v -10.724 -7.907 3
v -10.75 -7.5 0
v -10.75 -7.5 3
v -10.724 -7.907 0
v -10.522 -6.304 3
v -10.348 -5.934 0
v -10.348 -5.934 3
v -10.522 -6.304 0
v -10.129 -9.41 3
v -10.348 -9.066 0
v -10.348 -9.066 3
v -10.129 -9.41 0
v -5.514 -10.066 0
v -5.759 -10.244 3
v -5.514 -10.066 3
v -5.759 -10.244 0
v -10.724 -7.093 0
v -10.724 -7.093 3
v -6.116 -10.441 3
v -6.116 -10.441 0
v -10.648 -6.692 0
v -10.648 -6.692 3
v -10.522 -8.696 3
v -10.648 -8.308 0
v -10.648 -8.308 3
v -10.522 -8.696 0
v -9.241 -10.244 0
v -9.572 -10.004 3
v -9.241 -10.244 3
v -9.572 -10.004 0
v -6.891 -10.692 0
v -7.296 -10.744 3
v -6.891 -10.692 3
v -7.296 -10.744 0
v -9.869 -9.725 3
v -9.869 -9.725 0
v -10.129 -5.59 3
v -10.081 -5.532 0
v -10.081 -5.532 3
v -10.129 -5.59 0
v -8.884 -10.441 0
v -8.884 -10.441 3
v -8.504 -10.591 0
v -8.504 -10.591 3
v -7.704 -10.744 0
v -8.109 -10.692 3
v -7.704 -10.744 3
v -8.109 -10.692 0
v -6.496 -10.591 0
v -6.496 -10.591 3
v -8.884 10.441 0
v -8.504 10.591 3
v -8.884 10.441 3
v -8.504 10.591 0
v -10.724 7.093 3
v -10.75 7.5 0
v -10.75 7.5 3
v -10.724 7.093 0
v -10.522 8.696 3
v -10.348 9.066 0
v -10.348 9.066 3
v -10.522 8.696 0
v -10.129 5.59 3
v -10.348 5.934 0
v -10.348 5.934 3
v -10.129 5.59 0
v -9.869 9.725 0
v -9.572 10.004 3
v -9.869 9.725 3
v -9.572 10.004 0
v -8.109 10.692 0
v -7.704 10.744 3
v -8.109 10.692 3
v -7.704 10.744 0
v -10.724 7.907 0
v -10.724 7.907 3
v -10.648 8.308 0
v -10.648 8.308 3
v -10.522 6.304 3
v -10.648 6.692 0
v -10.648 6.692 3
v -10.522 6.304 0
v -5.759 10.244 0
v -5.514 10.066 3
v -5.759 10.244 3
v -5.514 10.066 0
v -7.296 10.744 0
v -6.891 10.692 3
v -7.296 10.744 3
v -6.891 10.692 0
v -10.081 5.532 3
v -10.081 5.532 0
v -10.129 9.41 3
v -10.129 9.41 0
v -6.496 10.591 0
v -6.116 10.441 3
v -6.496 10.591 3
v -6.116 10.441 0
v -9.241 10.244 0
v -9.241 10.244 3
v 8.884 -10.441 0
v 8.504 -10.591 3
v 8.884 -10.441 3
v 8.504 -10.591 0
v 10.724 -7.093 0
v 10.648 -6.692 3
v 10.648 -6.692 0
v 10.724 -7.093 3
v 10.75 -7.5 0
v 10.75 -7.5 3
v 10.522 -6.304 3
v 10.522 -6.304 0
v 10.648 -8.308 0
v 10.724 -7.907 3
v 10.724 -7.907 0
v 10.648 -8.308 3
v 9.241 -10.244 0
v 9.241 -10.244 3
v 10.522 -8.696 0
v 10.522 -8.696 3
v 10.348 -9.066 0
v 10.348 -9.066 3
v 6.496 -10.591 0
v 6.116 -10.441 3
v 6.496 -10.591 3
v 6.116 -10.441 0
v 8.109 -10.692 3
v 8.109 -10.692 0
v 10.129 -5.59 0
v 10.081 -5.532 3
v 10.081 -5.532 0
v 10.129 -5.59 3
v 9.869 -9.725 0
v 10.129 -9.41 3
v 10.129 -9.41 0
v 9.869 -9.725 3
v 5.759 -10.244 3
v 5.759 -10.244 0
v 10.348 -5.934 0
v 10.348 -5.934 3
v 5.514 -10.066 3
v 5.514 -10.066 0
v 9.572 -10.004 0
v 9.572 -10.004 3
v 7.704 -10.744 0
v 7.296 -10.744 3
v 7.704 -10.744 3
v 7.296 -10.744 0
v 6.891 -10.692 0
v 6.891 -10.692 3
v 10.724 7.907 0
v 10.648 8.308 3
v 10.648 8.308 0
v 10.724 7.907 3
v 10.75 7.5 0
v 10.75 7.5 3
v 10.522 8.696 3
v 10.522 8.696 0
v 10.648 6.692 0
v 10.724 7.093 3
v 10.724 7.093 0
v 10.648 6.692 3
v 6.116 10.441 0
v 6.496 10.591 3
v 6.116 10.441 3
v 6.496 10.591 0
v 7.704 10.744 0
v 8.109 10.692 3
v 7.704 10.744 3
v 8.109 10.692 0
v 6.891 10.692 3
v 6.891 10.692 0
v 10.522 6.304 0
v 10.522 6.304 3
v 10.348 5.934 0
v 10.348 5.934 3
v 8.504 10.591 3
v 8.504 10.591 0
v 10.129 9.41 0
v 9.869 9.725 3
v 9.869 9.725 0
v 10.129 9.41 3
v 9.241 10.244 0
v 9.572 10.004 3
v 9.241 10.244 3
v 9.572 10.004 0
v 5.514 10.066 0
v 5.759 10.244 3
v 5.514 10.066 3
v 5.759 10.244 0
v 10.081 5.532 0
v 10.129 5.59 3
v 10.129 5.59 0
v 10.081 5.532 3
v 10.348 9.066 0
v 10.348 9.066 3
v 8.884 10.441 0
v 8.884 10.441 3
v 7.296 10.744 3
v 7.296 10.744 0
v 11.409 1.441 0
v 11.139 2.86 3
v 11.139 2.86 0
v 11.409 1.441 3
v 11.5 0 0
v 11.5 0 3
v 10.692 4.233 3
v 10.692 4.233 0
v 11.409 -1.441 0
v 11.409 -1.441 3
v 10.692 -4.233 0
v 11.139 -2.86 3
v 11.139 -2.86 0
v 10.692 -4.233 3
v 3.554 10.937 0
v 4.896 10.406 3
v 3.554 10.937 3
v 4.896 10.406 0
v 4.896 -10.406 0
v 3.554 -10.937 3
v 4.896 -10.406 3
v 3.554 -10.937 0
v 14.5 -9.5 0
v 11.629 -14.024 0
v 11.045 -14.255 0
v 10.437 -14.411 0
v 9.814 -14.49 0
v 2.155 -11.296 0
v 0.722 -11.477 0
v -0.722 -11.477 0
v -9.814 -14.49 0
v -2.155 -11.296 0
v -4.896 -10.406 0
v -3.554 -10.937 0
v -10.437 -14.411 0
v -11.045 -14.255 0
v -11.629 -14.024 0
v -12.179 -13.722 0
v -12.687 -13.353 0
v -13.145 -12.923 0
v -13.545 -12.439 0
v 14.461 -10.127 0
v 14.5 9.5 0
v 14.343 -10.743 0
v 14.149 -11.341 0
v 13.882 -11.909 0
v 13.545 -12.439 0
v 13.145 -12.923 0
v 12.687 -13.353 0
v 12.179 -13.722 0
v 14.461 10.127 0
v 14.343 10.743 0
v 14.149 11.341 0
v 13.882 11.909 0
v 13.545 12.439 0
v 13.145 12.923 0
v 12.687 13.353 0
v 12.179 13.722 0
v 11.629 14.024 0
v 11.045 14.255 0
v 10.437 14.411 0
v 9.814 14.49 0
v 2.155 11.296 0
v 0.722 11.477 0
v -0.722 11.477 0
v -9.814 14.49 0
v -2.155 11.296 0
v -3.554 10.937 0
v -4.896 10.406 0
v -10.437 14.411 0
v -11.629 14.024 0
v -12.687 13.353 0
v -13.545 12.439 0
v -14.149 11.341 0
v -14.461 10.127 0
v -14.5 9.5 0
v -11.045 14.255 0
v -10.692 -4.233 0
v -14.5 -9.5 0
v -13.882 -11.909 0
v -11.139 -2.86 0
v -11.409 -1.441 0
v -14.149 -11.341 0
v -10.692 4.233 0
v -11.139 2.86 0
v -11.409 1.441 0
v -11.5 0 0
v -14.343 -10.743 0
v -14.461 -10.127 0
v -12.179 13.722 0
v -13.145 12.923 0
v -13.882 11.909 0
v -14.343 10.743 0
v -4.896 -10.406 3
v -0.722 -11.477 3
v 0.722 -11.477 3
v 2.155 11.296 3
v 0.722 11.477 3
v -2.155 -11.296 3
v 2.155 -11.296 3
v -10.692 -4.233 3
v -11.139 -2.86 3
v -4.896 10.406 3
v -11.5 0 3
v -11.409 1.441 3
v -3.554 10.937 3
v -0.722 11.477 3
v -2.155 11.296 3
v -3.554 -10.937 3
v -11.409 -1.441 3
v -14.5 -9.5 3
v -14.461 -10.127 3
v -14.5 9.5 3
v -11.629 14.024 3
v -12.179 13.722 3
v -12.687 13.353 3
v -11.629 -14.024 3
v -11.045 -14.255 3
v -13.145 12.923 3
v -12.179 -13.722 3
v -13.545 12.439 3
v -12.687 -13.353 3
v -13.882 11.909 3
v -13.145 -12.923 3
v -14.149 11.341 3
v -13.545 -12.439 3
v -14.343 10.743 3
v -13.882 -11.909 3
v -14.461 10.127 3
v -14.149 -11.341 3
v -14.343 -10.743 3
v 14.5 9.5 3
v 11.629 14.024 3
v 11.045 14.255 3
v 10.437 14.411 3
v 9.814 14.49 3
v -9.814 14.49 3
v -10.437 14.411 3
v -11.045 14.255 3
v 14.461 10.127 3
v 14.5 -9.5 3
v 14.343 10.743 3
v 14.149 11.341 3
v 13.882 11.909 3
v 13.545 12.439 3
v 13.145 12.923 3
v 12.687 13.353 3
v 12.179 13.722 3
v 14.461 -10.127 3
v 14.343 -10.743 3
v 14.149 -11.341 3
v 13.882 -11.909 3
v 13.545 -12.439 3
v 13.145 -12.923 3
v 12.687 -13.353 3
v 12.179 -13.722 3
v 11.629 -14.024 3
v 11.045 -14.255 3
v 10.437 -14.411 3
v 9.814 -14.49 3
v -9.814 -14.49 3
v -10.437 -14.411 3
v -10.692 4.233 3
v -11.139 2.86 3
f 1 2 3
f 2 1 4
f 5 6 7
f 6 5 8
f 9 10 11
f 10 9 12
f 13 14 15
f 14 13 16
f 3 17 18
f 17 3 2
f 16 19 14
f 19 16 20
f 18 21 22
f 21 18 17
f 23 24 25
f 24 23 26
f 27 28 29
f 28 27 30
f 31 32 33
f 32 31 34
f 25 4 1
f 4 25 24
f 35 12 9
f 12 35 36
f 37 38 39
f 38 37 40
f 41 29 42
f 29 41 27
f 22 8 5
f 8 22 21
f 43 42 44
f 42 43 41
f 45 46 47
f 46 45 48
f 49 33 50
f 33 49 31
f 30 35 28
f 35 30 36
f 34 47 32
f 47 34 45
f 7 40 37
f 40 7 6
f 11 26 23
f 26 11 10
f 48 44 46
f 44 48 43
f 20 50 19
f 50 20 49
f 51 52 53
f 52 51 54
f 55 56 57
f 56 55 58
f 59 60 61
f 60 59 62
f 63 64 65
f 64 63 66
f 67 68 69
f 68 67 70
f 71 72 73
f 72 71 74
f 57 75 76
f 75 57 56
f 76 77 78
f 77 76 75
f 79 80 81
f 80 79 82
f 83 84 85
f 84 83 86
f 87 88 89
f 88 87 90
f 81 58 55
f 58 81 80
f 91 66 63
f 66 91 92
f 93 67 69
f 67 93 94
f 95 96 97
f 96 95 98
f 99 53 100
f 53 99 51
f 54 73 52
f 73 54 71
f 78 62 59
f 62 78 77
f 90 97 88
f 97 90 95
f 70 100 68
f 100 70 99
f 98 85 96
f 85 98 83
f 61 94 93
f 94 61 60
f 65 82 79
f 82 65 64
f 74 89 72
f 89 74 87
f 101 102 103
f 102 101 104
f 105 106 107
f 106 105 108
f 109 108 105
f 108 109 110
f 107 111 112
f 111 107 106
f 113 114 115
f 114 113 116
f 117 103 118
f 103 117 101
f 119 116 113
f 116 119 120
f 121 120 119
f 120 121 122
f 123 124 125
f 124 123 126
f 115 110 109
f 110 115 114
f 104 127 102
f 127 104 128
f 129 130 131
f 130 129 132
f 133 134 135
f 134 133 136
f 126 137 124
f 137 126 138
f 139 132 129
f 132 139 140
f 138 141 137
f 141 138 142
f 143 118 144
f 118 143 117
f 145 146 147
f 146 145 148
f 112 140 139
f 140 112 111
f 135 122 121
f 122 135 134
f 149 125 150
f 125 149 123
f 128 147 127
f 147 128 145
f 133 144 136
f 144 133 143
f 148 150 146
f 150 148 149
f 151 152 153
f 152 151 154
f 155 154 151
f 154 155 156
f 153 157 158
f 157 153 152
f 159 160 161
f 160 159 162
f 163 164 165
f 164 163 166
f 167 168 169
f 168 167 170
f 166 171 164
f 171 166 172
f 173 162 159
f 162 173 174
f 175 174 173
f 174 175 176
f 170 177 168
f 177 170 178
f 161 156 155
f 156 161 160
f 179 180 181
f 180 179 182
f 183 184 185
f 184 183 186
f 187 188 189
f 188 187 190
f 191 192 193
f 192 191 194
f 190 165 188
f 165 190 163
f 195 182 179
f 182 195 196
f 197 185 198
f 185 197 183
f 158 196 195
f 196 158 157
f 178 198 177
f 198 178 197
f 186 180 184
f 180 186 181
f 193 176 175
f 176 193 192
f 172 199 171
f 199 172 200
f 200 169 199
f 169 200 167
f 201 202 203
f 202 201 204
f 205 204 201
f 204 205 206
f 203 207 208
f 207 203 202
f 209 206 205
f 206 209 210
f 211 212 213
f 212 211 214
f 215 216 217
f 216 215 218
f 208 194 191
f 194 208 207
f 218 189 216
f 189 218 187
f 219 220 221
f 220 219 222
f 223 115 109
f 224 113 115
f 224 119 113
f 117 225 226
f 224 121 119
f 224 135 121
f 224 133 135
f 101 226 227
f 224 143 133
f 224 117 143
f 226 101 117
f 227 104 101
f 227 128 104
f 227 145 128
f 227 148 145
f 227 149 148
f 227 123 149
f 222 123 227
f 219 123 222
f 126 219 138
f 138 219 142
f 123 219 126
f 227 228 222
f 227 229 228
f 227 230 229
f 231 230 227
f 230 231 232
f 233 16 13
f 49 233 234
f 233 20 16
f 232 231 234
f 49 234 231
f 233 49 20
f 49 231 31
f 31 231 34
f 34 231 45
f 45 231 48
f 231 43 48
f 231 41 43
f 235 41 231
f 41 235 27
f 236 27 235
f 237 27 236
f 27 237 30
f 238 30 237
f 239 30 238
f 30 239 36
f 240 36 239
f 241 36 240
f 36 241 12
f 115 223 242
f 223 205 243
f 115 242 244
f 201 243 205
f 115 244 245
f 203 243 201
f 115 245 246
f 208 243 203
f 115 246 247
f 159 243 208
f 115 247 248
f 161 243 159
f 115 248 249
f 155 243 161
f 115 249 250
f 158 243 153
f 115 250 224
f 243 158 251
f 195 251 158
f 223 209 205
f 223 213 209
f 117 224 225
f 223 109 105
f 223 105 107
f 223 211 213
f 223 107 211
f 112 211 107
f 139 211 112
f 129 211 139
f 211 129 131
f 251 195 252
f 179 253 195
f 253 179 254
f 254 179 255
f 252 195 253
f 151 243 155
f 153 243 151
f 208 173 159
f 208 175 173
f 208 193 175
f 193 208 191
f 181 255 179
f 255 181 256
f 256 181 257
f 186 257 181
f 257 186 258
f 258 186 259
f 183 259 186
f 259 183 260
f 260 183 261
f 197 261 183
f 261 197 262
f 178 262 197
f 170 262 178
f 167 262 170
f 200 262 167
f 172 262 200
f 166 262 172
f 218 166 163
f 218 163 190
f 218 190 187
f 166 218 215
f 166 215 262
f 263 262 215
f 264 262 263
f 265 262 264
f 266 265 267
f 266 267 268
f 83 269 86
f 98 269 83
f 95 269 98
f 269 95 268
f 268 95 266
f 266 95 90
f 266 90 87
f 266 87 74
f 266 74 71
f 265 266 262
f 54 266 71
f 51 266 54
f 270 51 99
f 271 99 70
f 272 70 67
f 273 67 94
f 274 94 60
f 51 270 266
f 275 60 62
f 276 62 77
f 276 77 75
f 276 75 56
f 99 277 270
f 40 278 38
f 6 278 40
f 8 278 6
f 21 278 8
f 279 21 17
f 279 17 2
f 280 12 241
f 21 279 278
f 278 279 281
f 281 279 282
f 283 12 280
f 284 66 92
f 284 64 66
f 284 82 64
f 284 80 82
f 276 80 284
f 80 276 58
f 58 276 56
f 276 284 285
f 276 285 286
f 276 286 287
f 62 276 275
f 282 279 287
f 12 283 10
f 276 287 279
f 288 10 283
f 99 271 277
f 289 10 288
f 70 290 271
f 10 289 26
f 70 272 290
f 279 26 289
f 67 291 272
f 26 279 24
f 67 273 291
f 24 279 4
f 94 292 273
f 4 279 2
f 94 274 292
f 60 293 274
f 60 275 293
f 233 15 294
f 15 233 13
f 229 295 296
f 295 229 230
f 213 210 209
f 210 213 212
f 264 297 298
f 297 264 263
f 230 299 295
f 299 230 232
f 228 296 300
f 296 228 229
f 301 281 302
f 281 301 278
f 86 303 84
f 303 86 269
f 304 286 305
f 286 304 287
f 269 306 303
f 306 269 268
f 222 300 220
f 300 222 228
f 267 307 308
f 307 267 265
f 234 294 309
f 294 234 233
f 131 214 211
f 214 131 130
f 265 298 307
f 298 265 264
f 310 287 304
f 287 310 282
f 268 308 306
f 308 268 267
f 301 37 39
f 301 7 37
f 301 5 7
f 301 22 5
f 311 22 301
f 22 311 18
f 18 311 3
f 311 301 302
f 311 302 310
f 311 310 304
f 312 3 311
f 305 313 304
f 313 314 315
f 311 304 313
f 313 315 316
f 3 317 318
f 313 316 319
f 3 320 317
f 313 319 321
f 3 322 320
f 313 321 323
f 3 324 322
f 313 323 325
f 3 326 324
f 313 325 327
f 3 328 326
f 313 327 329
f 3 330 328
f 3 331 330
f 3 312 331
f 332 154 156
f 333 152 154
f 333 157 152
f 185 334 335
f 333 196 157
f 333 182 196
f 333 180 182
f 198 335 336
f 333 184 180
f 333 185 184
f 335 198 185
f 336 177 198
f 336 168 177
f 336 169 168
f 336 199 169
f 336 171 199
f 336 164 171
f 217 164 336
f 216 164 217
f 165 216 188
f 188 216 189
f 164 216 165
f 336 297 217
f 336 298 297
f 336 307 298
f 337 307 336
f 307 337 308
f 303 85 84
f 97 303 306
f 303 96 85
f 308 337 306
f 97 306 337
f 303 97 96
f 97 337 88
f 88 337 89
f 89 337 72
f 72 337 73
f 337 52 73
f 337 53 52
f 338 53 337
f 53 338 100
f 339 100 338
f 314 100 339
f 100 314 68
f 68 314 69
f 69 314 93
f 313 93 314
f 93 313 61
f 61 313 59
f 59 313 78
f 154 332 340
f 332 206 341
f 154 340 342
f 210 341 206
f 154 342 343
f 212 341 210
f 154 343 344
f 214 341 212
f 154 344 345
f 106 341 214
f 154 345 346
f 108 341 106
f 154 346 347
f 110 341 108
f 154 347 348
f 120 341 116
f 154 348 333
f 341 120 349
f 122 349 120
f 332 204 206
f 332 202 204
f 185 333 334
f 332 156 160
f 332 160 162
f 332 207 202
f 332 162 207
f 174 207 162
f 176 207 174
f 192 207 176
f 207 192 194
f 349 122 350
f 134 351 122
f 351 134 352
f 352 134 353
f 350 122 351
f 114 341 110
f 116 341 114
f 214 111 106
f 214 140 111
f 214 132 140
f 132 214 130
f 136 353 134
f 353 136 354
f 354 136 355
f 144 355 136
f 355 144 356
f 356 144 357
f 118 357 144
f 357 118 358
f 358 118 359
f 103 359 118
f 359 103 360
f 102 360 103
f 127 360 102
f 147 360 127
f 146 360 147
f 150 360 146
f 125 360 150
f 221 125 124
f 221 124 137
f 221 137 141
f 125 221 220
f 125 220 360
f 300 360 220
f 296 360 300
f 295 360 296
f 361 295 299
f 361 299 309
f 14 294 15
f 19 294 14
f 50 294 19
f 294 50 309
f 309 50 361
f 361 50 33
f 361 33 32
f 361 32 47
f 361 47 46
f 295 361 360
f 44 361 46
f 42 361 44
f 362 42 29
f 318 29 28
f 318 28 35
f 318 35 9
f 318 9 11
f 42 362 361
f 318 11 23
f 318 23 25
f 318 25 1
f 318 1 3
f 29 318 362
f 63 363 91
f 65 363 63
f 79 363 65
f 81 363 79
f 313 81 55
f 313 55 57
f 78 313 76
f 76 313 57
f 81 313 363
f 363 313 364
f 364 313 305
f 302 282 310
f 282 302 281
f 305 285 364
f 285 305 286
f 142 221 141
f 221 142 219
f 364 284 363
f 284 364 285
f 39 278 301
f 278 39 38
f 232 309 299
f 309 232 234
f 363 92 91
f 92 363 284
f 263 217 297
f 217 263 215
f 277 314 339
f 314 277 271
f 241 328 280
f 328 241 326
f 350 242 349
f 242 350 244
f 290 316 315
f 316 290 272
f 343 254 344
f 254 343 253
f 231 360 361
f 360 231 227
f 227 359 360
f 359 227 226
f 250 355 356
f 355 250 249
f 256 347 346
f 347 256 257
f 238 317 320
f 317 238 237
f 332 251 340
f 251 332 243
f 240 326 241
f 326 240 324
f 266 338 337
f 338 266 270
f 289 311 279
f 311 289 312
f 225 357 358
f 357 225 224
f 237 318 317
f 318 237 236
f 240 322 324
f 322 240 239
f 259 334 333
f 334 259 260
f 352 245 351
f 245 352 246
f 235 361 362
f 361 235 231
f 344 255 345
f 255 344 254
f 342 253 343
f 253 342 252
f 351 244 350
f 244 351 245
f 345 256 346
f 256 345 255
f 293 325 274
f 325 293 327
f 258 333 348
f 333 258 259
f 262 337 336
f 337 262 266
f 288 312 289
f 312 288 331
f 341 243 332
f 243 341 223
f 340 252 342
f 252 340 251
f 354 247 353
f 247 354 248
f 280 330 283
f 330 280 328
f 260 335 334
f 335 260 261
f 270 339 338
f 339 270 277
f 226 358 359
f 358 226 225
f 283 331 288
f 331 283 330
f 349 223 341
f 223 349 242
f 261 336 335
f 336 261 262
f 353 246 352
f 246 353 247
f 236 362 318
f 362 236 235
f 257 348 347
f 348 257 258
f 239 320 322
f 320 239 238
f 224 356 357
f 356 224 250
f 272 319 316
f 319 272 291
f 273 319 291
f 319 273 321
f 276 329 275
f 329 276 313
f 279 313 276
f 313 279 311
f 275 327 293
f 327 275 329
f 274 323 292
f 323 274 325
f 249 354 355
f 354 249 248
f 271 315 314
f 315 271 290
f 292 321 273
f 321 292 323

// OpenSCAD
$fn = 50;

difference() {
	union() {
		hull() {
			translate(v = [-9.5, 9.5, 0]) {
				cylinder(h = 3, r = 5);
			}
			translate(v = [9.5, 9.5, 0]) {
				cylinder(h = 3, r = 5);
			}
			translate(v = [-9.5, -9.5, 0]) {
				cylinder(h = 3, r = 5);
			}
			translate(v = [9.5, -9.5, 0]) {
				cylinder(h = 3, r = 5);
			}
		}
	}
	union() {
		translate(v = [-7.5, -7.5, -100.0]) {
			cylinder(h = 200, r = 3.25);
		}
		translate(v = [-7.5, 7.5, -100.0]) {
			cylinder(h = 200, r = 3.25);
		}
		translate(v = [7.5, -7.5, -100.0]) {
			cylinder(h = 200, r = 3.25);
		}
		translate(v = [7.5, 7.5, -100.0]) {
			cylinder(h = 200, r = 3.25);
		}
		translate(v = [-7.5, -7.5, -100.0]) {
			cylinder(h = 200, r = 1.8);
		}
		translate(v = [-7.5, 7.5, -100.0]) {
			cylinder(h = 200, r = 1.8);
		}
		translate(v = [7.5, -7.5, -100.0]) {
			cylinder(h = 200, r = 1.8);
		}
		translate(v = [7.5, 7.5, -100.0]) {
			cylinder(h = 200, r = 1.8);
		}
		cylinder(h = 3, r = 11.5);
	}
}
